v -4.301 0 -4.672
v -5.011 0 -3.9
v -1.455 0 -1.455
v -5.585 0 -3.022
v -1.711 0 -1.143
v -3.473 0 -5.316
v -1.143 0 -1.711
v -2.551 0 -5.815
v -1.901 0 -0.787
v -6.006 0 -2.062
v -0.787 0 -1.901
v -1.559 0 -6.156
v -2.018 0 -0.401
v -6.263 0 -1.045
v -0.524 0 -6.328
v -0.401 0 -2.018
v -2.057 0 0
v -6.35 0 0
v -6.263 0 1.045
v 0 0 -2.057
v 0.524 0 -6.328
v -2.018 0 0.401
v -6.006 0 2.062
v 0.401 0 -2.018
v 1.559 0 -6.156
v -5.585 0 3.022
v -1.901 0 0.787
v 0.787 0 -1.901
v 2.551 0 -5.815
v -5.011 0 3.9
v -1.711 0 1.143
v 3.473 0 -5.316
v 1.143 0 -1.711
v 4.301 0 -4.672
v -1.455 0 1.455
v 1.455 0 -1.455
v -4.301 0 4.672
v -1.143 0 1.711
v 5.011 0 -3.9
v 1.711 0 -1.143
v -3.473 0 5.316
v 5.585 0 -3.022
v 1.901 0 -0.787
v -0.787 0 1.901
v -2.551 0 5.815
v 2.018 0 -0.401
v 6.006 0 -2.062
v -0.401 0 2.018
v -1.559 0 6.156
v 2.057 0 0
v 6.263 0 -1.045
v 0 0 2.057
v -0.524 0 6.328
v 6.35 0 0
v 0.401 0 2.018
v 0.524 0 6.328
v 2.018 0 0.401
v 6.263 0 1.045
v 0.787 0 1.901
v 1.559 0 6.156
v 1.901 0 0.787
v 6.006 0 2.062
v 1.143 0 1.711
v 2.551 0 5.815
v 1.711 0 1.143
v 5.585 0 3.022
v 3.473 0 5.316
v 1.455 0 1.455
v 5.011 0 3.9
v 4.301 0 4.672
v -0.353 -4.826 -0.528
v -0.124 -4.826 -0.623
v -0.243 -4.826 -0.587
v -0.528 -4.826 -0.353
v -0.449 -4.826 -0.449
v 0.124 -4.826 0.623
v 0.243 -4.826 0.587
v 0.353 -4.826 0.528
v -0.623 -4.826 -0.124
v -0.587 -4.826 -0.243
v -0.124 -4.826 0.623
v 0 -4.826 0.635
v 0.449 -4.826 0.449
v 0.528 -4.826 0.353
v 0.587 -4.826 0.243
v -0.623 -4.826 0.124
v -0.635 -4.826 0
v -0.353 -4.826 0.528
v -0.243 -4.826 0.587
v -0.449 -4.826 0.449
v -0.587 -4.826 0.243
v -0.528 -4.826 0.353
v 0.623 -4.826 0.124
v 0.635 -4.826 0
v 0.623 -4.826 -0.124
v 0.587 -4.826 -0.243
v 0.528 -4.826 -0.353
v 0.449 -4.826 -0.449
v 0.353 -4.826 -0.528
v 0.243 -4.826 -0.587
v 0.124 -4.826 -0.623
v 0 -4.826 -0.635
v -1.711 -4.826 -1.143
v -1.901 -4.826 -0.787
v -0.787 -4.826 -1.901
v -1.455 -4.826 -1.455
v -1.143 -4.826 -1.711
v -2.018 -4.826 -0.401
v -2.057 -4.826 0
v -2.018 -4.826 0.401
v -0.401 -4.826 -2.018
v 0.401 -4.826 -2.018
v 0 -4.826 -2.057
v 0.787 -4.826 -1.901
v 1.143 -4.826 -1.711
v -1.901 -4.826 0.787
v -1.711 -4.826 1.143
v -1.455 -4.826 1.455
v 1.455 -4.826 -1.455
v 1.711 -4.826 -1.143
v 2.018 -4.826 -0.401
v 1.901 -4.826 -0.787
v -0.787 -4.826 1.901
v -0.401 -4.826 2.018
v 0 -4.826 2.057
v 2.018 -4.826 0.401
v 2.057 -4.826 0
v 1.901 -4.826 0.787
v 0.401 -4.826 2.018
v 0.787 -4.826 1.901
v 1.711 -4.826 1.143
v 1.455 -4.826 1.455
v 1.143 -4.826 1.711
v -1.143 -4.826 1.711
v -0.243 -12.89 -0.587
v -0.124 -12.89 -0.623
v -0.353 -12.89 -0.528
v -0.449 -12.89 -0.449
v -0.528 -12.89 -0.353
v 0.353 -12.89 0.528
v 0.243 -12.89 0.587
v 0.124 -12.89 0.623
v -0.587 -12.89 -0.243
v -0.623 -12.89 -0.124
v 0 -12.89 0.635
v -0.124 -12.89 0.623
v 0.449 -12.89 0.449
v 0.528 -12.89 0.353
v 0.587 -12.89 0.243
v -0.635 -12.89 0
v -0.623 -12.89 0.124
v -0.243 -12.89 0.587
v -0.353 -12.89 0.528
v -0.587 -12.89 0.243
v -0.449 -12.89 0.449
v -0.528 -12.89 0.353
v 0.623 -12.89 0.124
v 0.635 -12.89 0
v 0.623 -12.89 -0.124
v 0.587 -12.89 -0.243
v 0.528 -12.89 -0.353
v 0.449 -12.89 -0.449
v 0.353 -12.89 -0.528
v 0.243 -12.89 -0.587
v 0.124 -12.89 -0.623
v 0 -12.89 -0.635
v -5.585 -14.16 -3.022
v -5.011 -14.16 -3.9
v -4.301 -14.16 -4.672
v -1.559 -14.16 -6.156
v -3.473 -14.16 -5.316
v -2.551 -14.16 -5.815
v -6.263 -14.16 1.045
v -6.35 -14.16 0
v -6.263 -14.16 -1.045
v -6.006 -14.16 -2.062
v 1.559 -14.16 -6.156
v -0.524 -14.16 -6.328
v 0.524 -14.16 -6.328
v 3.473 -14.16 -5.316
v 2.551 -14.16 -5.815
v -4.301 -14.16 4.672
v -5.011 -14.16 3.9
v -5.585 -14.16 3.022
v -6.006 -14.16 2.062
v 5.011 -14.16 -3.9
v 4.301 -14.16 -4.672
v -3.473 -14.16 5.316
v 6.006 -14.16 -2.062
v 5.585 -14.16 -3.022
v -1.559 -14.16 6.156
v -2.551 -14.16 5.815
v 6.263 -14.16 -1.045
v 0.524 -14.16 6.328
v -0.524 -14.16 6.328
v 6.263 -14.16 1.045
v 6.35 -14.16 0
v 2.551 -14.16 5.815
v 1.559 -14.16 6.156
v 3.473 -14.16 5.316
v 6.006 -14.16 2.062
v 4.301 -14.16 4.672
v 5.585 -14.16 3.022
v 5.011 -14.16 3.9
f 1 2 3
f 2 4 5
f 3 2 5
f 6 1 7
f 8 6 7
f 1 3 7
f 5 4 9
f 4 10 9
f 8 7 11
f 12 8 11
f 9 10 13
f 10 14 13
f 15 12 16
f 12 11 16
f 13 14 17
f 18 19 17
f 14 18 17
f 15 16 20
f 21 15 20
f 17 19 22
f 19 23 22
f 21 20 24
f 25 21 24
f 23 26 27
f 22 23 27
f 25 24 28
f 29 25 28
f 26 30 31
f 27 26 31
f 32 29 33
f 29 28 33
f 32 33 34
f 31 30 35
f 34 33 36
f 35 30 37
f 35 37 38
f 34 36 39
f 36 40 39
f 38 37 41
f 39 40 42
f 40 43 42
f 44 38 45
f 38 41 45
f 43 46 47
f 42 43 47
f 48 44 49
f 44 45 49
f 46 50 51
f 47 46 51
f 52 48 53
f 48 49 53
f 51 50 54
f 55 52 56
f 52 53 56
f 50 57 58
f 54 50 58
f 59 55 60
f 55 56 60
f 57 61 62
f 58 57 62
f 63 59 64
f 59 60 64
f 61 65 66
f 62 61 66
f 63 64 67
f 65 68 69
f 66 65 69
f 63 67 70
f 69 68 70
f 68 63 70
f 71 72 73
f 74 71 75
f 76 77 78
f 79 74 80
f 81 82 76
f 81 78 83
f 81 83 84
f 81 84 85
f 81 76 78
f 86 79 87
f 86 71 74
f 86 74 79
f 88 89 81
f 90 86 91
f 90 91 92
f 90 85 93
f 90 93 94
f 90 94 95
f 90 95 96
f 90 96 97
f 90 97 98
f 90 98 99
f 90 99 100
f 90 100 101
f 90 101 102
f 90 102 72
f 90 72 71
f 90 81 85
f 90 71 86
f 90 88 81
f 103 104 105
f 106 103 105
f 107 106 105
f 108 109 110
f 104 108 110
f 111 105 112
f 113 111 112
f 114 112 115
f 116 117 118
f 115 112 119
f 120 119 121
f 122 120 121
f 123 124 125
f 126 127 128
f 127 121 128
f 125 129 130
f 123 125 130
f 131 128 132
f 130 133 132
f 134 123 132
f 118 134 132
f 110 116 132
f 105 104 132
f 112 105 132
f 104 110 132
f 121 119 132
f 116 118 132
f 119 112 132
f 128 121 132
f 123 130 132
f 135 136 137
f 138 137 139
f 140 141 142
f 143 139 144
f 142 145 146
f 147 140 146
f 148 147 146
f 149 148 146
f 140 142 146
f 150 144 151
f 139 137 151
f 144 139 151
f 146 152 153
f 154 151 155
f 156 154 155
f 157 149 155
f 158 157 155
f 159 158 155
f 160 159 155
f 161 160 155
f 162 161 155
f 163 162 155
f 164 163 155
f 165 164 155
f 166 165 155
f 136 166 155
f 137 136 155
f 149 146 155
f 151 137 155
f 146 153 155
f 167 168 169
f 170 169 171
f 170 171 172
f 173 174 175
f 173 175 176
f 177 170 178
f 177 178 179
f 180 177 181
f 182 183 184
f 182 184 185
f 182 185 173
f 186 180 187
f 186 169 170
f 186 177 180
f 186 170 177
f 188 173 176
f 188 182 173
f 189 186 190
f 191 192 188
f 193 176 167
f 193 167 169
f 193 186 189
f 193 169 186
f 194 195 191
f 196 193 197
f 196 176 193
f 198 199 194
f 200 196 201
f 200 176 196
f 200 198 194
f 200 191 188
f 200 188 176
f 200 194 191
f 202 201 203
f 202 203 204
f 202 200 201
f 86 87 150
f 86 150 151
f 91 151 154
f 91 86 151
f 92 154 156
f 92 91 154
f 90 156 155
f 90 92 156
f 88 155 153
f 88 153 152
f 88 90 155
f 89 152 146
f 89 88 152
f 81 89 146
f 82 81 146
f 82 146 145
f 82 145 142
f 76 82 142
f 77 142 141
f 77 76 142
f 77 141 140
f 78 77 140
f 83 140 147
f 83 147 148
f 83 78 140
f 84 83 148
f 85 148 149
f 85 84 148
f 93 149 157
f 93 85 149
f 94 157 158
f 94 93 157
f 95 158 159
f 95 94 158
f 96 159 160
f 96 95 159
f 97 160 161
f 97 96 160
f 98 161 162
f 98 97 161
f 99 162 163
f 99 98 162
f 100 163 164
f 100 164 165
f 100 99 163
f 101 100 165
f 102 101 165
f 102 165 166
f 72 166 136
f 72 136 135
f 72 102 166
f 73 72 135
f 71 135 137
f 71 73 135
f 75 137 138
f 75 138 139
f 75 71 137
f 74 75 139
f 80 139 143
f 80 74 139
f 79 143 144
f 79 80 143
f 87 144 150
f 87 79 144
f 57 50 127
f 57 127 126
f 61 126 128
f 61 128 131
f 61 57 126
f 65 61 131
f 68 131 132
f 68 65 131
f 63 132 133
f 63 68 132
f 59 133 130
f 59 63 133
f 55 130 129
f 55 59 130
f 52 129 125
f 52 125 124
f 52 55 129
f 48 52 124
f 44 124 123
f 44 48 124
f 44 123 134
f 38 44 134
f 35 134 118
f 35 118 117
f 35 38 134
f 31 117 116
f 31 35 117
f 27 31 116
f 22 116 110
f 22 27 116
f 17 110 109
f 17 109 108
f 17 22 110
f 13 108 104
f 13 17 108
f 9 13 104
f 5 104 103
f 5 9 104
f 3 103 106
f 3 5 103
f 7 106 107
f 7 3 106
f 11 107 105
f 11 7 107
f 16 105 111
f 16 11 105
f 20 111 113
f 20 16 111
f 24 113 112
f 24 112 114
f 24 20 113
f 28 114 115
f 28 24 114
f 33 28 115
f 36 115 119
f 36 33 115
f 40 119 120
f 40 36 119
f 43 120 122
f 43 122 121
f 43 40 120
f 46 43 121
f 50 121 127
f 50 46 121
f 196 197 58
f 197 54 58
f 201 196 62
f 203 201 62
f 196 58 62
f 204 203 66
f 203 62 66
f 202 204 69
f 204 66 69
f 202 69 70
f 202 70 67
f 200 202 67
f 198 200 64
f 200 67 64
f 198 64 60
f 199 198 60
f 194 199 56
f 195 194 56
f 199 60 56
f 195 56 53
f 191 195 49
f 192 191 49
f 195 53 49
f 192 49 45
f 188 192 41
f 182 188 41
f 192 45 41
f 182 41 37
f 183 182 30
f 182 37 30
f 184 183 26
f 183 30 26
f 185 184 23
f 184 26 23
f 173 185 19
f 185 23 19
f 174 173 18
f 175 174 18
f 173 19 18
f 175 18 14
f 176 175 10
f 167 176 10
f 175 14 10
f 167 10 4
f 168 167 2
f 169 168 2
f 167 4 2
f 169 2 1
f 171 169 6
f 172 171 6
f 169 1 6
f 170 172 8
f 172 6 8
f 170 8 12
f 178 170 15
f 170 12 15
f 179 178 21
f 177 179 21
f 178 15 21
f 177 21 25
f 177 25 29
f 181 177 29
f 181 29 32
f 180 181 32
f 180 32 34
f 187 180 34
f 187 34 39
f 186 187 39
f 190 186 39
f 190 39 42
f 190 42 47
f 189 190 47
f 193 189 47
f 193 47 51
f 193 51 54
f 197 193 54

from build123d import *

# Parameters (mm, degrees)
F0_R     = 6.35
F0_R_2   = 2.0574
F1_DEPTH = 4.826
F2_R     = 6.35
F3_DEPTH = 9.3345
F4_R     = 0.635
F5_DEPTH = 8.0645


with BuildPart() as f1:
    # F0 (on Front) → F1 (new body)
    with BuildSketch(Plane.XZ):
        Circle(F0_R)
        Circle(F0_R_2, mode=Mode.SUBTRACT)
    extrude(amount=F1_DEPTH)

    # F2 (on face) → F3 (join)
    with BuildSketch(Plane.XZ.offset(4.826)):
        Circle(F2_R)
    extrude(amount=F3_DEPTH)


with BuildPart() as f5:
    # F4 (on face) → F5 (new body)
    with BuildSketch(Plane(origin=(0, -4.826, 0), x_dir=(-1, 0, 0), z_dir=(0, 1, 0))):
        Circle(F4_R)
    extrude(amount=-F5_DEPTH)


solid = Compound([f1.part, f5.part])
